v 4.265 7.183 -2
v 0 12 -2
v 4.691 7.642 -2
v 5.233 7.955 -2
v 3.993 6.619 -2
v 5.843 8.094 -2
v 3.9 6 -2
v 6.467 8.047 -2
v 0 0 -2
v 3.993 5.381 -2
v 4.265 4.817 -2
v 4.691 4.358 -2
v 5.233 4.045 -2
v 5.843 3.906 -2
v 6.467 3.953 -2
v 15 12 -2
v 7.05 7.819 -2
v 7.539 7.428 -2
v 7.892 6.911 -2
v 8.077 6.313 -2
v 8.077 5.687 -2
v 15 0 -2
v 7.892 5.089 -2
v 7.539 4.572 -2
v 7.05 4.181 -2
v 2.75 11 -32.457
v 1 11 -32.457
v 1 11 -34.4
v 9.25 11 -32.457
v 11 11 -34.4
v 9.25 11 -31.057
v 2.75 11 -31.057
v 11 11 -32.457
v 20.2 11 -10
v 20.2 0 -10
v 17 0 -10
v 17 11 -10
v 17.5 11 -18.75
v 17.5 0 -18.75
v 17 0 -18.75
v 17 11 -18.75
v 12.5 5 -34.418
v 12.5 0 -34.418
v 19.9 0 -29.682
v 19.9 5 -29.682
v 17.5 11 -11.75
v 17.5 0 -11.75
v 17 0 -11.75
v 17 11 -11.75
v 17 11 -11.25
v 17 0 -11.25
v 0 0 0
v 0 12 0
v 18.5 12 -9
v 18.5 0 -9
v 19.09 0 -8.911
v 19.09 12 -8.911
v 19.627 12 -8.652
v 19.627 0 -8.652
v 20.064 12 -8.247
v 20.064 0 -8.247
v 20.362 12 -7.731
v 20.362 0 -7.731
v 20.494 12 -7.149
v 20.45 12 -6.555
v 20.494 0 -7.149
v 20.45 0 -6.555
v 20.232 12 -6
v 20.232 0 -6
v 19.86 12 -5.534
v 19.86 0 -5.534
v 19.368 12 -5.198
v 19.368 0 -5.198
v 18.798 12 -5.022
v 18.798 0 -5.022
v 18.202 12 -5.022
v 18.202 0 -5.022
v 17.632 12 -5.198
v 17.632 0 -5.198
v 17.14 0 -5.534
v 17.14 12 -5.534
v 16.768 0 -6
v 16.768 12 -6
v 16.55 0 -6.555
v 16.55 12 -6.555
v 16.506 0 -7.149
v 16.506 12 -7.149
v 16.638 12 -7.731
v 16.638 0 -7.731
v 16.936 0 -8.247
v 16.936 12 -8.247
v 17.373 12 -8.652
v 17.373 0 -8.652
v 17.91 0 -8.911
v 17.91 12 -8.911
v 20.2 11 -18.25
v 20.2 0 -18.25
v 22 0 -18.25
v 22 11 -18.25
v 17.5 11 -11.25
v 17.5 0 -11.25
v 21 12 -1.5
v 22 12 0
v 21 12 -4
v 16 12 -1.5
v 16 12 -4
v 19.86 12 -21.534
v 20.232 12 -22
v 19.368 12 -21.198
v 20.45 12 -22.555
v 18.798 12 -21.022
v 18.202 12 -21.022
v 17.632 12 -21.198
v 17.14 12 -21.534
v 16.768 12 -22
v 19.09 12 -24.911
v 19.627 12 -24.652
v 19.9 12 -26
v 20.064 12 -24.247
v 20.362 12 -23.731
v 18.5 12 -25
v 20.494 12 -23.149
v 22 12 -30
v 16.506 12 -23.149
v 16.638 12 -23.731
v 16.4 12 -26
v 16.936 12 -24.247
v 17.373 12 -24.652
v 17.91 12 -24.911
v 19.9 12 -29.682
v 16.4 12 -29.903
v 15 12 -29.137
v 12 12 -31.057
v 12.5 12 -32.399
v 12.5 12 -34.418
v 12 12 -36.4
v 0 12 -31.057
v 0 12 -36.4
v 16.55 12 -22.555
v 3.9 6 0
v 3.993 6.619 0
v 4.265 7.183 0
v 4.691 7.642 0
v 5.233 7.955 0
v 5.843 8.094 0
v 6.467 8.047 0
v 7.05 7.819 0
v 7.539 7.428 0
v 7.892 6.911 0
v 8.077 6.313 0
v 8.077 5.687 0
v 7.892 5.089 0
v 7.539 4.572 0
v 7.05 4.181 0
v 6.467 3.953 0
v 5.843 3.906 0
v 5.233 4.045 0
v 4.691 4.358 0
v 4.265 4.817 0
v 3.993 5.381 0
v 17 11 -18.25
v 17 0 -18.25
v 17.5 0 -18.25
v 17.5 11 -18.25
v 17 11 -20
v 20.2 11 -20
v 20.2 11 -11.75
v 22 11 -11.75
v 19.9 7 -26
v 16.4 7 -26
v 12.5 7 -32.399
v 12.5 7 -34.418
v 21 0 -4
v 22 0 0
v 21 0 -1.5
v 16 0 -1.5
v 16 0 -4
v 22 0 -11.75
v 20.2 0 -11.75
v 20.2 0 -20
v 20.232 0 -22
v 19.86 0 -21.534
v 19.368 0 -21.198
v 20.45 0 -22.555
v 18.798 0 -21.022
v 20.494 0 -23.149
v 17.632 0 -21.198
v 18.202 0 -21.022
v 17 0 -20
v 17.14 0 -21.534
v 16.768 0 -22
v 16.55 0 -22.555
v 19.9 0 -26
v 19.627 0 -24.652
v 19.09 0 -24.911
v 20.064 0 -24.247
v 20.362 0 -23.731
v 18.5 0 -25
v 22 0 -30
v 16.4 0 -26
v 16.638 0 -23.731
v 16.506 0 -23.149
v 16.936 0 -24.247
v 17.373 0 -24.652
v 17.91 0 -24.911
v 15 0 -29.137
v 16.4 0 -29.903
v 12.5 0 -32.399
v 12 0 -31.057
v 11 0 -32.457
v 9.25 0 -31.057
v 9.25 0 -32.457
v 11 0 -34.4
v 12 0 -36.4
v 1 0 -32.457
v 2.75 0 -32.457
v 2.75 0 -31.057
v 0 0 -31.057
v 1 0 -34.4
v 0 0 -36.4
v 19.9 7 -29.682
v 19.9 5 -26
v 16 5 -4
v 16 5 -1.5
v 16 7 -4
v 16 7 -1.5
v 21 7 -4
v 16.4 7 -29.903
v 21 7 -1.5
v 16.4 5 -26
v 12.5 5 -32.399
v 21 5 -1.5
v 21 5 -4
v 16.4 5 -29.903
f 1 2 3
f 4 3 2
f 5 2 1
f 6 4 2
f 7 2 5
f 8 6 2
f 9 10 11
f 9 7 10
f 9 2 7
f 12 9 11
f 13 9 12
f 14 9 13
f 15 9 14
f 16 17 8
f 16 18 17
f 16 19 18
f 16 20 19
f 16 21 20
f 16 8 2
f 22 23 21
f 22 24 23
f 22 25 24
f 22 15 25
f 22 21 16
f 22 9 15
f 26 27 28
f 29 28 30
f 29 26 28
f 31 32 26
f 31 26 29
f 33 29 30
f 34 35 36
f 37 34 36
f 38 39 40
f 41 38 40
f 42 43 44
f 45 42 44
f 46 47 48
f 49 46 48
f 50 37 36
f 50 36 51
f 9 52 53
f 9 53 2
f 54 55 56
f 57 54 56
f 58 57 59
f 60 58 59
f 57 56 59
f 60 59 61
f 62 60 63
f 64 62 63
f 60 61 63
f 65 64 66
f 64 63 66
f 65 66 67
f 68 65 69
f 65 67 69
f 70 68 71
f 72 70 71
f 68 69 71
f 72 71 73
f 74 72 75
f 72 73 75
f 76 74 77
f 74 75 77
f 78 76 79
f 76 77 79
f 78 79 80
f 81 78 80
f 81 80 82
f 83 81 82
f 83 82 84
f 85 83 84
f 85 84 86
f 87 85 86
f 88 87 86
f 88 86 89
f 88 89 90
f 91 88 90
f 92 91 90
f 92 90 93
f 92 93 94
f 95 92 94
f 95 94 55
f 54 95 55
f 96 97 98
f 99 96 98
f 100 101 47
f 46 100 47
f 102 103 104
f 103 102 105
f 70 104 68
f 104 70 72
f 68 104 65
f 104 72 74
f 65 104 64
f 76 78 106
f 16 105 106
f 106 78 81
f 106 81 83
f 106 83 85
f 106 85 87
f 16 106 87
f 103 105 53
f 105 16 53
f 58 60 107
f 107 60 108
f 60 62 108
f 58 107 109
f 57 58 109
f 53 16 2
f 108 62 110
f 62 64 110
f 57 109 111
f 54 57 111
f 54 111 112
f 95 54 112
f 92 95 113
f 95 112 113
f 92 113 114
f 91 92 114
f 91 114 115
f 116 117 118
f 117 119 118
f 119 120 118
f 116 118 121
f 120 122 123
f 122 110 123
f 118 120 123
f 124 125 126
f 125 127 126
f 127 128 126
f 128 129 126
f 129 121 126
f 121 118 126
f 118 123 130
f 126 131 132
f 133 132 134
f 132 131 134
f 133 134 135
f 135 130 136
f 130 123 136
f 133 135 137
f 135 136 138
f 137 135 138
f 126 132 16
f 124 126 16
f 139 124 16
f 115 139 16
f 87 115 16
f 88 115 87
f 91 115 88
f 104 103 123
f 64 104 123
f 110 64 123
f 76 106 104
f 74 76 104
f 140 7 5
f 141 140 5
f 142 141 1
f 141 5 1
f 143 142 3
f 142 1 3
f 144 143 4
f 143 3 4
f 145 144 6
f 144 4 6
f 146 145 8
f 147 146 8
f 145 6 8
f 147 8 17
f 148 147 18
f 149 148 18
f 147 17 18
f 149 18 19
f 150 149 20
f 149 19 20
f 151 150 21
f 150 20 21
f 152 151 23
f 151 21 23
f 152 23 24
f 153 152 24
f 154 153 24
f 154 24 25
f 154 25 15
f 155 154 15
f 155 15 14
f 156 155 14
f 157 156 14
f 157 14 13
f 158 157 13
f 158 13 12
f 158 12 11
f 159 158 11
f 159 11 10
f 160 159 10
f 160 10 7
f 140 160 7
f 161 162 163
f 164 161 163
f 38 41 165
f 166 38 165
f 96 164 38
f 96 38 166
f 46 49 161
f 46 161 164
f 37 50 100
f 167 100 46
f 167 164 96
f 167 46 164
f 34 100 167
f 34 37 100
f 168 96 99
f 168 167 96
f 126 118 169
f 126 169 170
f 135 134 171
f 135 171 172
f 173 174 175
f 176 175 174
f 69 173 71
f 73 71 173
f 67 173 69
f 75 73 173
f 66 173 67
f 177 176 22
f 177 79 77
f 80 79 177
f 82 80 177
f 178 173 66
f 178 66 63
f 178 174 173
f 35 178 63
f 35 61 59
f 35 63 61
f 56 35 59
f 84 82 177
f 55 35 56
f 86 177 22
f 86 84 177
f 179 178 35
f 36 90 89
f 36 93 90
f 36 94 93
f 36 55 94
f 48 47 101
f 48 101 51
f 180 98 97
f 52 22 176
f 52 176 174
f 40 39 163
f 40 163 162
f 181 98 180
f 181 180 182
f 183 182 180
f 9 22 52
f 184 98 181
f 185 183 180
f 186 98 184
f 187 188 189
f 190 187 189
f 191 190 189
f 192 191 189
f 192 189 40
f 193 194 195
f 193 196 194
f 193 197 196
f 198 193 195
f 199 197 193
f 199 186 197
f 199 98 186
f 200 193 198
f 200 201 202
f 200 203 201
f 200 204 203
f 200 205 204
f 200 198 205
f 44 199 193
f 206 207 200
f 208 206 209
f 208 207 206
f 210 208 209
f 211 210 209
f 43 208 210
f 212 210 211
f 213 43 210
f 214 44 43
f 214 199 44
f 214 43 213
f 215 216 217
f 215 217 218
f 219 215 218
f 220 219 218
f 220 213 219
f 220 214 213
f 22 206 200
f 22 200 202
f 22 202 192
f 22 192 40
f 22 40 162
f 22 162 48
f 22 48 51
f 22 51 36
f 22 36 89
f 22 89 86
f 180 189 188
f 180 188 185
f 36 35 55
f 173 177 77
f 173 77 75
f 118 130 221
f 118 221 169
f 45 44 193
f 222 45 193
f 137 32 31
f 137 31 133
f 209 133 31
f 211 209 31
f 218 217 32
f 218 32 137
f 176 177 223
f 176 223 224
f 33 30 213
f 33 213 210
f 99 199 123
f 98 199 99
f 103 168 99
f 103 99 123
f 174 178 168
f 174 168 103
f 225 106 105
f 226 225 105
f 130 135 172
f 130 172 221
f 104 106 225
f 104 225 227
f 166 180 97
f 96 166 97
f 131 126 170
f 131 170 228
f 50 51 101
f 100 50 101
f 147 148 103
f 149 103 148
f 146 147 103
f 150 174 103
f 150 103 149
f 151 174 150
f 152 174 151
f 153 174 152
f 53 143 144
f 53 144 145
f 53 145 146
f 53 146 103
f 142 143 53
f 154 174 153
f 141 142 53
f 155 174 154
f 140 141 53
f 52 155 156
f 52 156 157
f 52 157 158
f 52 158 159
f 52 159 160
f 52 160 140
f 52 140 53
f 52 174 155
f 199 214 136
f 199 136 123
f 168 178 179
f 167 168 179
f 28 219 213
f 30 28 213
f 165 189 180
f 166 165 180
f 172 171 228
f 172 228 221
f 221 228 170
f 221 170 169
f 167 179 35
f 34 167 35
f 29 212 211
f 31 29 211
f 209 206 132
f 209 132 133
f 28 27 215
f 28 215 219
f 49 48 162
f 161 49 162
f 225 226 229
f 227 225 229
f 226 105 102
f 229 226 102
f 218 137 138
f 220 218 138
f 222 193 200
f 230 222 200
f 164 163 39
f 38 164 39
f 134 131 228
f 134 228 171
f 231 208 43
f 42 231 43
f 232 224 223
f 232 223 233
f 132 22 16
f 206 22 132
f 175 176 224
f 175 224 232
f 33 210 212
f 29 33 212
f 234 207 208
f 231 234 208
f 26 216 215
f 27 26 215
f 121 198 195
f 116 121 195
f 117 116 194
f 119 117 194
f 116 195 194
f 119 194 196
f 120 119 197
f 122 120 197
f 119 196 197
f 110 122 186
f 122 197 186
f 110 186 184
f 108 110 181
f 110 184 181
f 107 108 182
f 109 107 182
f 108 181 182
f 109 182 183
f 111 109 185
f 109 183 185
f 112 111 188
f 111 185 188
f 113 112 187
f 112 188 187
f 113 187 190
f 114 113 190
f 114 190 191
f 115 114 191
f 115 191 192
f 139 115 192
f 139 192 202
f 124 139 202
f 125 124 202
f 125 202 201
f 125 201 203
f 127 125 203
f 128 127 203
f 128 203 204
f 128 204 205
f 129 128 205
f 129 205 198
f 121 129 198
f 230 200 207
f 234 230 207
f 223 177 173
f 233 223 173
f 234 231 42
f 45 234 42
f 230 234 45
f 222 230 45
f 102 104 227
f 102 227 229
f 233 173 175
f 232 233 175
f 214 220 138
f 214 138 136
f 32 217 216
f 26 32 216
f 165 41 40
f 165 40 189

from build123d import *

# Parameters (mm, degrees)
EXTRUDE_1_DEPTH     = 12
SKETCH_2_W          = 5
SKETCH_2_H          = 2.5
CUT_EXTRUDE_1_DEPTH = 5
CUT_EXTRUDE_START   = -12
SKETCH_2_3_W        = 5
SKETCH_2_3_H        = 2.5
CUT_EXTRUDE_3_DEPTH = 5
SKETCH_2_4_R        = 2
CUT_EXTRUDE_4_DEPTH = 45.192307023
CUT_EXTRUDE_5_DEPTH = 11
SKETCH1_R           = 2.1
CUT_EXTRUDE1_DEPTH  = 43.560075188


with BuildPart() as part:
    # 草图1 → 凸台-拉伸1 (new body)
    with BuildSketch(Plane(origin=(0, 0, 0), x_dir=(1, 0, 0), z_dir=(0, 1, 0))):
        Polygon((0, 0), (0, 2), (15, 2), (15, 29.137304051), (12, 31.057304051), (0, 31.057304051), (0, 36.4), (12, 36.4), (22, 30), (22, 0), align=None)
    extrude(amount=EXTRUDE_1_DEPTH)

    # 草图2 → 切除-拉伸1 (cut)
    with BuildSketch(Plane.XZ):
        Polygon((12.5, -32.399476124), (12.5, -34.417827927), (19.9, -29.681827927), (19.9, -26), (16.4, -26), (16.4, -29.903476124), align=None)
        with Locations((18.5, -2.75)):
            Rectangle(SKETCH_2_W, SKETCH_2_H)
    extrude(amount=-CUT_EXTRUDE_1_DEPTH, mode=Mode.SUBTRACT)

    # 草图2<3> → 切除-拉伸3 (cut)
    with BuildSketch(Plane.XZ.offset(CUT_EXTRUDE_START)):
        Polygon((16.4, -26), (16.4, -29.903476124), (12.5, -32.399476124), (12.5, -34.417827927), (19.9, -29.681827927), (19.9, -26), align=None)
        with Locations((18.5, -2.75)):
            Rectangle(SKETCH_2_3_W, SKETCH_2_3_H)
    extrude(amount=CUT_EXTRUDE_3_DEPTH, mode=Mode.SUBTRACT)

    # 草图2<4> → 切除-拉伸4 (cut, through all)
    with BuildSketch(Plane.XZ):
        with Locations(Location((18.5, -23, 0), (0, 0, 270))):
            Circle(SKETCH_2_4_R)
        with Locations(Location((18.5, -7, 0), (0, 0, 270))):
            Circle(SKETCH_2_4_R)
    extrude(amount=-CUT_EXTRUDE_4_DEPTH, mode=Mode.SUBTRACT)

    # 草图2<5> → 切除-拉伸5 (cut)
    with BuildSketch(Plane.XZ):
        Polygon((1, -32.457304051), (1, -34.4), (11, -34.4), (11, -32.457304051), (9.25, -32.457304051), (9.25, -31.057304051), (2.75, -31.057304051), (2.75, -32.457304051), align=None)
        Polygon((17, -18.75), (17, -20), (20.2, -20), (20.2, -18.25), (22, -18.25), (22, -11.75), (20.2, -11.75), (20.2, -10), (17, -10), (17, -11.25), (17.5, -11.25), (17.5, -11.75), (17, -11.75), (17, -18.25), (17.5, -18.25), (17.5, -18.75), align=None)
    extrude(amount=-CUT_EXTRUDE_5_DEPTH, mode=Mode.SUBTRACT)

    # Sketch1 → Cut-Extrude1 (cut, through all)
    with BuildSketch(Plane(origin=(0, 0, -2), x_dir=(-1, 0, 0), z_dir=(0, 0, -1))):
        with Locations((-6, 6)):
            Circle(SKETCH1_R)
    extrude(amount=-CUT_EXTRUDE1_DEPTH, mode=Mode.SUBTRACT)


solid = part.part
